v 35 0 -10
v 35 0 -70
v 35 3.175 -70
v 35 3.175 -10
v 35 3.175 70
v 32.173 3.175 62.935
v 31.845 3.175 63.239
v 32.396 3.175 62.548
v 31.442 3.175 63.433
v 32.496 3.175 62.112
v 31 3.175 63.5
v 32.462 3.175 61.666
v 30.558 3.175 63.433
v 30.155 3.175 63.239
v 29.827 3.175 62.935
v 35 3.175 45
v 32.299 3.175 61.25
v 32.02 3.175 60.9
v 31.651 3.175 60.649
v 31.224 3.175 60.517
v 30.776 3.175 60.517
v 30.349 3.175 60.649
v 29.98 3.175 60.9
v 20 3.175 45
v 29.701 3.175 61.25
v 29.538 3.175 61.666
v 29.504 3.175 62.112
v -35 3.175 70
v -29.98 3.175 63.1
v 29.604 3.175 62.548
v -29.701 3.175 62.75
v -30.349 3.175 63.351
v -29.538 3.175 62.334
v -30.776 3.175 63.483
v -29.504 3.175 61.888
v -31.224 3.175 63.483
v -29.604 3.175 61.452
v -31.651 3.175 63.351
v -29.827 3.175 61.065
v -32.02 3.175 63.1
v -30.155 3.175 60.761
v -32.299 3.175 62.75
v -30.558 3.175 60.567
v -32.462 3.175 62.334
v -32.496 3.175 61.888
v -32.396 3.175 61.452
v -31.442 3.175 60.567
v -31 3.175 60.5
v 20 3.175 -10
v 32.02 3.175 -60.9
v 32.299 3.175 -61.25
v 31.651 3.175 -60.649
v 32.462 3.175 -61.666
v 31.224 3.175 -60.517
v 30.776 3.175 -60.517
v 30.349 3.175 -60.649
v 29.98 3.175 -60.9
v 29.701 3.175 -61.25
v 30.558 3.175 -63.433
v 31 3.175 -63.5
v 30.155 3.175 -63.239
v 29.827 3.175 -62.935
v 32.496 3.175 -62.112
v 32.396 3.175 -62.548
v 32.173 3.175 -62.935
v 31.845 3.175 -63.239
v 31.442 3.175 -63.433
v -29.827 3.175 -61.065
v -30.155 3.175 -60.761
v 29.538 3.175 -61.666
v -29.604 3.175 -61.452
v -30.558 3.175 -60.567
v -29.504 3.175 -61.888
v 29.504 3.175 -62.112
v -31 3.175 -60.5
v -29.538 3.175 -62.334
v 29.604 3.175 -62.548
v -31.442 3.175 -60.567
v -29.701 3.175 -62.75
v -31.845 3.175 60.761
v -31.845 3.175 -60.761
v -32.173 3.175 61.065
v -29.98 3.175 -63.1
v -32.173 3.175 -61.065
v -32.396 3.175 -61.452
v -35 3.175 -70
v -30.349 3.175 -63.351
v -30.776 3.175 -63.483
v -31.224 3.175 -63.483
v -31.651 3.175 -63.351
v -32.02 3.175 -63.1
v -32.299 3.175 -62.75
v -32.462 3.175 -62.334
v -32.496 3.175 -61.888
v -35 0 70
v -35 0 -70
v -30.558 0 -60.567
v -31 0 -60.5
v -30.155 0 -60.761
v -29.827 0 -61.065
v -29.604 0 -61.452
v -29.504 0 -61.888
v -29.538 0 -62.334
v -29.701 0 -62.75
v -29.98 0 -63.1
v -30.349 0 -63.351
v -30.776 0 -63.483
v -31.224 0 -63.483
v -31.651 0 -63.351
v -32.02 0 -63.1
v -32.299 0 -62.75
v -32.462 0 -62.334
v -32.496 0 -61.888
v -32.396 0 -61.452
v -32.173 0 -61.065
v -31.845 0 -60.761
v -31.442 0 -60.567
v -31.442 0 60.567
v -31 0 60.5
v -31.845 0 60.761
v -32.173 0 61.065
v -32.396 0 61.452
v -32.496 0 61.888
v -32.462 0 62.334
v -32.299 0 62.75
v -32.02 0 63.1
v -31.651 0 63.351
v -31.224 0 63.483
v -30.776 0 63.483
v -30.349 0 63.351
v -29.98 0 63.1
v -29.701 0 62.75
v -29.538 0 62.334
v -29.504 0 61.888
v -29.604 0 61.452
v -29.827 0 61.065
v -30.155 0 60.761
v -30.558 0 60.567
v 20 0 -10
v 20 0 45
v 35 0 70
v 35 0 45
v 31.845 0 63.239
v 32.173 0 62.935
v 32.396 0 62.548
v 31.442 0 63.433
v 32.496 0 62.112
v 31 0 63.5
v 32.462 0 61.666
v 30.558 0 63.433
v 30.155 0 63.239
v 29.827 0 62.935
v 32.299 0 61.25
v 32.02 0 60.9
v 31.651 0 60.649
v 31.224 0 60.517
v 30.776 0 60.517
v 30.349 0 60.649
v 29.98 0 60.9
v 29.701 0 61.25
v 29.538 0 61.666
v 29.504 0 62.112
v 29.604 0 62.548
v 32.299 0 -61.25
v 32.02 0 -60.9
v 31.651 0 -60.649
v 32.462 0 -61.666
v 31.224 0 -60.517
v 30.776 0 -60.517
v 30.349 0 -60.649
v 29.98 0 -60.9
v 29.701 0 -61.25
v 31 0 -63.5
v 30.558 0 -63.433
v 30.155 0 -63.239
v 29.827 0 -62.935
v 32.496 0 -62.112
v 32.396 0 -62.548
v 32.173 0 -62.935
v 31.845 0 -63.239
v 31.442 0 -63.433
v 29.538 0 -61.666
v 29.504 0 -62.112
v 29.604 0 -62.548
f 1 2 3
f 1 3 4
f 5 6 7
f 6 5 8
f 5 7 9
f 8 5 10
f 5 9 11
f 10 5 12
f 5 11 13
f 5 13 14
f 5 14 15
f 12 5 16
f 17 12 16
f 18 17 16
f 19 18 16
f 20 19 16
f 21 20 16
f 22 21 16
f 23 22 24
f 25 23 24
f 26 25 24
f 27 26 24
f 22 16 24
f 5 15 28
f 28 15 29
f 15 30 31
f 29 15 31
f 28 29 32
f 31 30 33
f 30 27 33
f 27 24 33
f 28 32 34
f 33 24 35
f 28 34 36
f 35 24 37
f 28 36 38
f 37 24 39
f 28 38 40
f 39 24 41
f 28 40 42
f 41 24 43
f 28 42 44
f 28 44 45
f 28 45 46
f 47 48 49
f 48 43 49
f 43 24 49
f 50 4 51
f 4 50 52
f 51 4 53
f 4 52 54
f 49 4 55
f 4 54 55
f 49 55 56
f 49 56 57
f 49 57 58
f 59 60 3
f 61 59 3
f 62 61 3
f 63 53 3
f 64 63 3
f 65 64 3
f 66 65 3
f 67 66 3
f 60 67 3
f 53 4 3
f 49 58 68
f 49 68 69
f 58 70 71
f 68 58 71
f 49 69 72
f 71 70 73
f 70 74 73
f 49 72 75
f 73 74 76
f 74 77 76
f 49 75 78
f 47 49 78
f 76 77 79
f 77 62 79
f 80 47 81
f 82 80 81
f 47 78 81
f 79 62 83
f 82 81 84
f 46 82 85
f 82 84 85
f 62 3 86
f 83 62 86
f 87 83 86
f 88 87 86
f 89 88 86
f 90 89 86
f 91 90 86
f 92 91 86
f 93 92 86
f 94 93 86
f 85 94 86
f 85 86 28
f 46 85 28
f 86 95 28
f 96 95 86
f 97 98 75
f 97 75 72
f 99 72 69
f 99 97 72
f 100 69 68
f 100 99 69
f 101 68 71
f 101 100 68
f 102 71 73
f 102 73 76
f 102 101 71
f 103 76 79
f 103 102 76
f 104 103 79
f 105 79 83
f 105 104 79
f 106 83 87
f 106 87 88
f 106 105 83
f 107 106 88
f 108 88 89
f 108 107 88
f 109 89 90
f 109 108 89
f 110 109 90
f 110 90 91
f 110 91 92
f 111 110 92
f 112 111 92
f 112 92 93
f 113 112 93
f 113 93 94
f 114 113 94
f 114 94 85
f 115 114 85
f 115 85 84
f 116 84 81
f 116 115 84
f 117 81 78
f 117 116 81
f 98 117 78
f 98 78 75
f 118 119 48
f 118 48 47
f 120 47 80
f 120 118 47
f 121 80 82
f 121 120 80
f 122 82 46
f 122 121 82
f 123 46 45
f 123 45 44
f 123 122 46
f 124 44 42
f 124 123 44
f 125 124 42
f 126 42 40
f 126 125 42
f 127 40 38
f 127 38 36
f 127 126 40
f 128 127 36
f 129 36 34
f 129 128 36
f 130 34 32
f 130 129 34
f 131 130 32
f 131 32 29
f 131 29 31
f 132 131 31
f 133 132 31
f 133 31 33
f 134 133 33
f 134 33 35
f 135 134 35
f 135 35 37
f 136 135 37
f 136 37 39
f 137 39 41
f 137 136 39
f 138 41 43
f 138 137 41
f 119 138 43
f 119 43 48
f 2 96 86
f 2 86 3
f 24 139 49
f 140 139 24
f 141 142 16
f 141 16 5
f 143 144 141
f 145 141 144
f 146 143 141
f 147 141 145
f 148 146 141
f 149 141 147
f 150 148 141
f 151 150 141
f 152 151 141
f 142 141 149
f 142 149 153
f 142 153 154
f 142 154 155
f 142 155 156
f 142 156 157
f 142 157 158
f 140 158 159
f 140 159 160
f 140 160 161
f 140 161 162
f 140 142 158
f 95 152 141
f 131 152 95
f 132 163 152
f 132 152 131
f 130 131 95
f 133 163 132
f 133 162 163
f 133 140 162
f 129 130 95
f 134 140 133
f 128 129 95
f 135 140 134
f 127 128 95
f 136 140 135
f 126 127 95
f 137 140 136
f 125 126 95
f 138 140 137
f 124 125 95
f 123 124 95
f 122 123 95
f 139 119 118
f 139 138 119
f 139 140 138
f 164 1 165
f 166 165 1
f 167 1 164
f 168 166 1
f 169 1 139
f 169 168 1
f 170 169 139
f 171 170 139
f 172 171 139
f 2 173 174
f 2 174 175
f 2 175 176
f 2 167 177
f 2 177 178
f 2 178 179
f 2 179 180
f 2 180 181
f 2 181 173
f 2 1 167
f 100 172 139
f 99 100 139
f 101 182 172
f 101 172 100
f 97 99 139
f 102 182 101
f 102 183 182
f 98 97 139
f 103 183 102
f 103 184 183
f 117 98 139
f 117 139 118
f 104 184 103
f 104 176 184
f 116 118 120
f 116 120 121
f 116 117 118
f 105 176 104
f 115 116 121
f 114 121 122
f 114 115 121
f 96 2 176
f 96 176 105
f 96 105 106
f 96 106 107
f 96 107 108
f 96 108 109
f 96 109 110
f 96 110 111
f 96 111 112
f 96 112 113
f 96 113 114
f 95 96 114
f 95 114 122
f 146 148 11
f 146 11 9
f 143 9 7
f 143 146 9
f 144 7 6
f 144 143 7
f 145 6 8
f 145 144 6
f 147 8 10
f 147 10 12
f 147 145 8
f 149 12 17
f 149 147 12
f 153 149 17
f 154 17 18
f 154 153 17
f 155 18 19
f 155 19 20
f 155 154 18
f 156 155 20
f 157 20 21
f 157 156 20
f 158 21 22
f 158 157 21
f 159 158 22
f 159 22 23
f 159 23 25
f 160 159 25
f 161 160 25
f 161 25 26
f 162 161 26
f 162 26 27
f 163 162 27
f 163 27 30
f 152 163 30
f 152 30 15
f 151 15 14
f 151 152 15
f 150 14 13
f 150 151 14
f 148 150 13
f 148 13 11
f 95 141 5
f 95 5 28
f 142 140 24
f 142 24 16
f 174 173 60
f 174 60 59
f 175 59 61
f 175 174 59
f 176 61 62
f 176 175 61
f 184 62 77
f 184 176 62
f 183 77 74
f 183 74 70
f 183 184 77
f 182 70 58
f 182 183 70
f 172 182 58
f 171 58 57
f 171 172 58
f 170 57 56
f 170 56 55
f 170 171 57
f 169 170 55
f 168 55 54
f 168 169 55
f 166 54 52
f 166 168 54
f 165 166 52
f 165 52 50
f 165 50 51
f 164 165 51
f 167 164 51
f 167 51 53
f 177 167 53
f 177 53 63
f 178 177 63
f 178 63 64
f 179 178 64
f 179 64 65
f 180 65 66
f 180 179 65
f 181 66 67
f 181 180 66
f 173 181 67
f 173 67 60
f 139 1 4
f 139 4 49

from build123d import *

# Parameters (mm, degrees)
SKETCH1_R           = 1.5
BOSS_EXTRUDE1_DEPTH = 3.175


with BuildPart() as part:
    # Sketch1 → Boss-Extrude1 (new body)
    with BuildSketch(Plane(origin=(0, 0, 0), x_dir=(1, 0, 0), z_dir=(0, 1, 0))):
        Polygon((35, 9.999999982), (20, 9.999999982), (20, -45), (35, -45), (35, -70), (-35, -70), (-35, 70), (35, 70), align=None)
        with Locations(Location((31, -62, 0), (0, 0, 270))):
            Circle(SKETCH1_R, mode=Mode.SUBTRACT)
        with Locations(Location((-31, -62, 0), (0, 0, 90))):
            Circle(SKETCH1_R, mode=Mode.SUBTRACT)
        with Locations(Location((-31, 62, 0), (0, 0, 270))):
            Circle(SKETCH1_R, mode=Mode.SUBTRACT)
        with Locations(Location((31, 62, 0), (0, 0, 90))):
            Circle(SKETCH1_R, mode=Mode.SUBTRACT)
    extrude(amount=BOSS_EXTRUDE1_DEPTH)


solid = part.part
